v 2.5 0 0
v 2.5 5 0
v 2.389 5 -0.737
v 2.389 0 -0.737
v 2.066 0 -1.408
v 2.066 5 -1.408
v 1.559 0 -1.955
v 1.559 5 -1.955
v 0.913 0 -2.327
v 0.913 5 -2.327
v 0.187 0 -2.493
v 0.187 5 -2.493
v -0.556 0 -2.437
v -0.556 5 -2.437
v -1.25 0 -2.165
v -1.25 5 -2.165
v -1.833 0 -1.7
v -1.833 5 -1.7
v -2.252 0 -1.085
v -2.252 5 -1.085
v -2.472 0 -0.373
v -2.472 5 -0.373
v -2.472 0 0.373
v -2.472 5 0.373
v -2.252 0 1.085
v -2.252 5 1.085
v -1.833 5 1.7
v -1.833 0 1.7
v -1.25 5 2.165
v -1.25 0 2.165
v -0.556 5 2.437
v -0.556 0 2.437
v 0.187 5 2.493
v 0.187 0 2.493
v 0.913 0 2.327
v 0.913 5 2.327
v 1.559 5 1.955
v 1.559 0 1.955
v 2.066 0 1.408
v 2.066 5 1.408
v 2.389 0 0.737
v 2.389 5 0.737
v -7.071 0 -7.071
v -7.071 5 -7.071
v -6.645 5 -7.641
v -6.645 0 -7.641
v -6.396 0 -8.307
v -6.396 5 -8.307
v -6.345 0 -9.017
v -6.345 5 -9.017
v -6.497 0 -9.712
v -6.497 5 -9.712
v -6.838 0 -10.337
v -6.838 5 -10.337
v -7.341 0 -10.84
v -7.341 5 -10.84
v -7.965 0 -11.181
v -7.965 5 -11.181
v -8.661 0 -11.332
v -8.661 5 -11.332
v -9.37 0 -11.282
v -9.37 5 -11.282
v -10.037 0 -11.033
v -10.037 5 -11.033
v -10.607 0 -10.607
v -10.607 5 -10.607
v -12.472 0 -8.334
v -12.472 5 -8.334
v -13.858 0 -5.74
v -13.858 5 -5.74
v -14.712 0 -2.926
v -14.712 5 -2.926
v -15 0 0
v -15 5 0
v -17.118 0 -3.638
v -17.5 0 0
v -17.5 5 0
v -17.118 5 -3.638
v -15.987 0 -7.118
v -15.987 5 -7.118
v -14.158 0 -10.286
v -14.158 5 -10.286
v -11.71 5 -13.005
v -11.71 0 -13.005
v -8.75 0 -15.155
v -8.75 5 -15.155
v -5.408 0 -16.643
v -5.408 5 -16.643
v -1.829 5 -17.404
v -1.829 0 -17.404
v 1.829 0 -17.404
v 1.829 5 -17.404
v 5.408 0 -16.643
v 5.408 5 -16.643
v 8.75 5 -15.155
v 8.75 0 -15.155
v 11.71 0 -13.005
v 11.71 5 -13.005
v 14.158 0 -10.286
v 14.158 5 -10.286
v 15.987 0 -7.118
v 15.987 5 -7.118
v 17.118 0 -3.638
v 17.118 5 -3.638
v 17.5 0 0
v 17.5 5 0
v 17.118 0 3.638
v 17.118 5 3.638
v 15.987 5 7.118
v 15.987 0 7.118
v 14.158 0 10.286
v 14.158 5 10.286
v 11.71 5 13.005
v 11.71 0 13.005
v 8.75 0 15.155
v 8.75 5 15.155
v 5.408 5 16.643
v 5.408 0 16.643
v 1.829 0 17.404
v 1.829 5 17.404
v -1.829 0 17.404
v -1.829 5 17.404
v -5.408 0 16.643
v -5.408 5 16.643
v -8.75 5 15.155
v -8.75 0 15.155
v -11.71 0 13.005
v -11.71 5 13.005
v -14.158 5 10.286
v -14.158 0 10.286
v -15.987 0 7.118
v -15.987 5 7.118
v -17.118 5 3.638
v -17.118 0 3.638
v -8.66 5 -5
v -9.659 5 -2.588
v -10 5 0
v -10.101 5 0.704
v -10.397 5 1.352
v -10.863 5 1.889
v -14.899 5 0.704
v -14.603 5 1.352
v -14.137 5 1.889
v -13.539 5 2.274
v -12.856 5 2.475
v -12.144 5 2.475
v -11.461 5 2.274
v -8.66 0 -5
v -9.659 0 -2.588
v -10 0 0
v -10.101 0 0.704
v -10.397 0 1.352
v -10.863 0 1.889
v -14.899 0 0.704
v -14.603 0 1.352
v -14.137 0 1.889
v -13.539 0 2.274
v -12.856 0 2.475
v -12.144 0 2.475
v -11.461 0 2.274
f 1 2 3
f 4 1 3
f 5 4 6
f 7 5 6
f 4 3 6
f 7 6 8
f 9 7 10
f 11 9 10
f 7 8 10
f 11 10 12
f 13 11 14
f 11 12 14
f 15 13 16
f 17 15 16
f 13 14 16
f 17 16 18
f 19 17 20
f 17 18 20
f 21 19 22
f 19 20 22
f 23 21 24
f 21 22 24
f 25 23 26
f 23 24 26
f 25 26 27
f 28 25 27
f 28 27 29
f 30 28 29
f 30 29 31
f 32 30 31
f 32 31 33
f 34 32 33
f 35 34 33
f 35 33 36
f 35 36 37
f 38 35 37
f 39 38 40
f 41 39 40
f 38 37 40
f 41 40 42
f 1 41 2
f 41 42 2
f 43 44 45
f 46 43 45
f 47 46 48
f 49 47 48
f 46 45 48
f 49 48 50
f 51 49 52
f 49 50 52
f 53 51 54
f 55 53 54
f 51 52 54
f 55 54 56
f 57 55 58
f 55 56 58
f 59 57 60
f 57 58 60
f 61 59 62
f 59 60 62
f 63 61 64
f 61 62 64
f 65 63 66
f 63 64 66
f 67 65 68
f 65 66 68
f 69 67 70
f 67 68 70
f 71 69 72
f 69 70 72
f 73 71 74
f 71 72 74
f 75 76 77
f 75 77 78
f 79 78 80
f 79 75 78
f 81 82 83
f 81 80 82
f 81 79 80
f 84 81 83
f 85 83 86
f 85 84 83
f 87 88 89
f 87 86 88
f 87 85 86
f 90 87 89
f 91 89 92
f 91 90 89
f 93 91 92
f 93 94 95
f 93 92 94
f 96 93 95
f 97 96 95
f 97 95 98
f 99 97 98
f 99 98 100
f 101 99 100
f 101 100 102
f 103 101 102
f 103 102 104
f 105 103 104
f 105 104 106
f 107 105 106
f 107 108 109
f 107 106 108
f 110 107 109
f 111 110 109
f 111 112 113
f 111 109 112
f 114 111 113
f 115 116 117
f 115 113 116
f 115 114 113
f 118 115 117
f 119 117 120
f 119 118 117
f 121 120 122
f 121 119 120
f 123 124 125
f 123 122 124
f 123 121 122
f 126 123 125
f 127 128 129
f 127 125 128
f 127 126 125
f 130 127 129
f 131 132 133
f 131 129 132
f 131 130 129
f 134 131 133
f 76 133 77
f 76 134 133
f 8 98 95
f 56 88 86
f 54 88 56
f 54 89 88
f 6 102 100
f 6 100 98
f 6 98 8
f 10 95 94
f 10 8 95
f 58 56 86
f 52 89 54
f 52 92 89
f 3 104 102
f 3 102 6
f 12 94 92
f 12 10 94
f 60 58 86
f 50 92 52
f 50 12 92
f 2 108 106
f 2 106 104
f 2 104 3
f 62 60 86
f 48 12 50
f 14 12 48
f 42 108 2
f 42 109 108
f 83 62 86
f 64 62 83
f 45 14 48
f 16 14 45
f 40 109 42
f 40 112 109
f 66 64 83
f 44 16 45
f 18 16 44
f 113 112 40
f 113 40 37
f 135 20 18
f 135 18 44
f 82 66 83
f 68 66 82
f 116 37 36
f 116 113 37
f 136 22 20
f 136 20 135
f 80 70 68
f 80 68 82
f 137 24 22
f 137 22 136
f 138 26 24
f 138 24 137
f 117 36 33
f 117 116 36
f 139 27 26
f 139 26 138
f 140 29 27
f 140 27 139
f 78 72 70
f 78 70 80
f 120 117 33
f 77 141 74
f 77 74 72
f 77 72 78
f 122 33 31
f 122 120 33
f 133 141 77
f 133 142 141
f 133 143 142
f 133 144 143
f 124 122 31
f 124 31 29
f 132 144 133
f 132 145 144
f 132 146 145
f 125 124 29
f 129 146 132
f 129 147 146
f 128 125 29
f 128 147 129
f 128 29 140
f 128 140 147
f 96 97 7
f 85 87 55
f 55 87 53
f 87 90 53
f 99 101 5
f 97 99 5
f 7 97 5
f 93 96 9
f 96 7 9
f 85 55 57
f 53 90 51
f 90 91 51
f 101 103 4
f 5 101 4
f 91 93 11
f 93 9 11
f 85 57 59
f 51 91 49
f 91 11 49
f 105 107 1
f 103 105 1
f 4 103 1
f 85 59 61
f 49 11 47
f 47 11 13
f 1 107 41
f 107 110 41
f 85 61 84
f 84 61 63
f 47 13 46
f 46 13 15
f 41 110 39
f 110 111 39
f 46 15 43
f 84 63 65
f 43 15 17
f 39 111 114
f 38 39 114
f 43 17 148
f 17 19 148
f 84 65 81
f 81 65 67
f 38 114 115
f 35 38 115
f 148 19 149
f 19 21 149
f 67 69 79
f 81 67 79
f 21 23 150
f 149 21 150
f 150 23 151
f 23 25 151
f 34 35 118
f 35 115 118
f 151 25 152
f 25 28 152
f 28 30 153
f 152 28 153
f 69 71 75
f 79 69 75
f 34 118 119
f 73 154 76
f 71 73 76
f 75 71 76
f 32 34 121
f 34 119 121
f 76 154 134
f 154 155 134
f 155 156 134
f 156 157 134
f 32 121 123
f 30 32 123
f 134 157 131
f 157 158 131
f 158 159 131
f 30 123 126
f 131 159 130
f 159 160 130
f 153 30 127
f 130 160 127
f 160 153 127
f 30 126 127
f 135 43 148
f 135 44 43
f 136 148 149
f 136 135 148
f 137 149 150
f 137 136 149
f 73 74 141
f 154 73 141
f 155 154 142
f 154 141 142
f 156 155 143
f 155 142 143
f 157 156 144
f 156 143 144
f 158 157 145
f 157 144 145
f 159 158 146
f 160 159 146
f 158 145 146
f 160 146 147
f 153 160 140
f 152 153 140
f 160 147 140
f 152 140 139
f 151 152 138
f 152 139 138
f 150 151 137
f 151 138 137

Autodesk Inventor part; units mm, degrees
ref_plane "YZ Plane" through (0, 0, 0) normal (1, 0, 0) x (0, 1, 0)
ref_plane "XZ Plane" through (0, 0, 0) normal (0, 1, 0) x (-1, 0, 0)
ref_plane "XY Plane" through (0, 0, 0) normal (0, 0, 1) x (1, 0, 0)
sketch "Sketch1" plane through (0, 0, 0) normal (0, 1, 0) x (-1, 0, 0)
  circle A0 centre (0, 0) radius 17.5
  dimension "d0" = 35
extrude "Extrusion1" add sketch "Sketch1" along normal blind 5
sketch "Sketch2" plane through (0, 5, 0) normal (0, 1, 0) x (1, 0, 0)
  arc A0 (-10.6066, 10.6066) -> (-15, 0) centre (0, 0) ccw
  line L0 (0, 0) -> (-10.6066, 10.6066) construction
  line L1 (0, 0) -> (-15, 0) construction
  arc A1 (-7.0711, 7.0711) -> (-10, 0) centre (0, 0) ccw
  arc A2 (-15, 0) -> (-10, 0) centre (-12.5, 0) ccw
  arc A3 (-7.0711, 7.0711) -> (-10.6066, 10.6066) centre (-8.8388, 8.8388) ccw
  dimension "kat" = 45
  dimension "d8" = 45
extrude "Extrusion2" cut sketch "Sketch2" against normal through all
sketch "Sketch3" plane through (0, 5, 0) normal (0, 1, 0) x (1, 0, 0)
  circle A0 centre (0, 0) radius 2.5
  dimension "d11" = 5
extrude "Extrusion3" cut sketch "Sketch3" against normal through all
equation "\"d8\" = kat"
